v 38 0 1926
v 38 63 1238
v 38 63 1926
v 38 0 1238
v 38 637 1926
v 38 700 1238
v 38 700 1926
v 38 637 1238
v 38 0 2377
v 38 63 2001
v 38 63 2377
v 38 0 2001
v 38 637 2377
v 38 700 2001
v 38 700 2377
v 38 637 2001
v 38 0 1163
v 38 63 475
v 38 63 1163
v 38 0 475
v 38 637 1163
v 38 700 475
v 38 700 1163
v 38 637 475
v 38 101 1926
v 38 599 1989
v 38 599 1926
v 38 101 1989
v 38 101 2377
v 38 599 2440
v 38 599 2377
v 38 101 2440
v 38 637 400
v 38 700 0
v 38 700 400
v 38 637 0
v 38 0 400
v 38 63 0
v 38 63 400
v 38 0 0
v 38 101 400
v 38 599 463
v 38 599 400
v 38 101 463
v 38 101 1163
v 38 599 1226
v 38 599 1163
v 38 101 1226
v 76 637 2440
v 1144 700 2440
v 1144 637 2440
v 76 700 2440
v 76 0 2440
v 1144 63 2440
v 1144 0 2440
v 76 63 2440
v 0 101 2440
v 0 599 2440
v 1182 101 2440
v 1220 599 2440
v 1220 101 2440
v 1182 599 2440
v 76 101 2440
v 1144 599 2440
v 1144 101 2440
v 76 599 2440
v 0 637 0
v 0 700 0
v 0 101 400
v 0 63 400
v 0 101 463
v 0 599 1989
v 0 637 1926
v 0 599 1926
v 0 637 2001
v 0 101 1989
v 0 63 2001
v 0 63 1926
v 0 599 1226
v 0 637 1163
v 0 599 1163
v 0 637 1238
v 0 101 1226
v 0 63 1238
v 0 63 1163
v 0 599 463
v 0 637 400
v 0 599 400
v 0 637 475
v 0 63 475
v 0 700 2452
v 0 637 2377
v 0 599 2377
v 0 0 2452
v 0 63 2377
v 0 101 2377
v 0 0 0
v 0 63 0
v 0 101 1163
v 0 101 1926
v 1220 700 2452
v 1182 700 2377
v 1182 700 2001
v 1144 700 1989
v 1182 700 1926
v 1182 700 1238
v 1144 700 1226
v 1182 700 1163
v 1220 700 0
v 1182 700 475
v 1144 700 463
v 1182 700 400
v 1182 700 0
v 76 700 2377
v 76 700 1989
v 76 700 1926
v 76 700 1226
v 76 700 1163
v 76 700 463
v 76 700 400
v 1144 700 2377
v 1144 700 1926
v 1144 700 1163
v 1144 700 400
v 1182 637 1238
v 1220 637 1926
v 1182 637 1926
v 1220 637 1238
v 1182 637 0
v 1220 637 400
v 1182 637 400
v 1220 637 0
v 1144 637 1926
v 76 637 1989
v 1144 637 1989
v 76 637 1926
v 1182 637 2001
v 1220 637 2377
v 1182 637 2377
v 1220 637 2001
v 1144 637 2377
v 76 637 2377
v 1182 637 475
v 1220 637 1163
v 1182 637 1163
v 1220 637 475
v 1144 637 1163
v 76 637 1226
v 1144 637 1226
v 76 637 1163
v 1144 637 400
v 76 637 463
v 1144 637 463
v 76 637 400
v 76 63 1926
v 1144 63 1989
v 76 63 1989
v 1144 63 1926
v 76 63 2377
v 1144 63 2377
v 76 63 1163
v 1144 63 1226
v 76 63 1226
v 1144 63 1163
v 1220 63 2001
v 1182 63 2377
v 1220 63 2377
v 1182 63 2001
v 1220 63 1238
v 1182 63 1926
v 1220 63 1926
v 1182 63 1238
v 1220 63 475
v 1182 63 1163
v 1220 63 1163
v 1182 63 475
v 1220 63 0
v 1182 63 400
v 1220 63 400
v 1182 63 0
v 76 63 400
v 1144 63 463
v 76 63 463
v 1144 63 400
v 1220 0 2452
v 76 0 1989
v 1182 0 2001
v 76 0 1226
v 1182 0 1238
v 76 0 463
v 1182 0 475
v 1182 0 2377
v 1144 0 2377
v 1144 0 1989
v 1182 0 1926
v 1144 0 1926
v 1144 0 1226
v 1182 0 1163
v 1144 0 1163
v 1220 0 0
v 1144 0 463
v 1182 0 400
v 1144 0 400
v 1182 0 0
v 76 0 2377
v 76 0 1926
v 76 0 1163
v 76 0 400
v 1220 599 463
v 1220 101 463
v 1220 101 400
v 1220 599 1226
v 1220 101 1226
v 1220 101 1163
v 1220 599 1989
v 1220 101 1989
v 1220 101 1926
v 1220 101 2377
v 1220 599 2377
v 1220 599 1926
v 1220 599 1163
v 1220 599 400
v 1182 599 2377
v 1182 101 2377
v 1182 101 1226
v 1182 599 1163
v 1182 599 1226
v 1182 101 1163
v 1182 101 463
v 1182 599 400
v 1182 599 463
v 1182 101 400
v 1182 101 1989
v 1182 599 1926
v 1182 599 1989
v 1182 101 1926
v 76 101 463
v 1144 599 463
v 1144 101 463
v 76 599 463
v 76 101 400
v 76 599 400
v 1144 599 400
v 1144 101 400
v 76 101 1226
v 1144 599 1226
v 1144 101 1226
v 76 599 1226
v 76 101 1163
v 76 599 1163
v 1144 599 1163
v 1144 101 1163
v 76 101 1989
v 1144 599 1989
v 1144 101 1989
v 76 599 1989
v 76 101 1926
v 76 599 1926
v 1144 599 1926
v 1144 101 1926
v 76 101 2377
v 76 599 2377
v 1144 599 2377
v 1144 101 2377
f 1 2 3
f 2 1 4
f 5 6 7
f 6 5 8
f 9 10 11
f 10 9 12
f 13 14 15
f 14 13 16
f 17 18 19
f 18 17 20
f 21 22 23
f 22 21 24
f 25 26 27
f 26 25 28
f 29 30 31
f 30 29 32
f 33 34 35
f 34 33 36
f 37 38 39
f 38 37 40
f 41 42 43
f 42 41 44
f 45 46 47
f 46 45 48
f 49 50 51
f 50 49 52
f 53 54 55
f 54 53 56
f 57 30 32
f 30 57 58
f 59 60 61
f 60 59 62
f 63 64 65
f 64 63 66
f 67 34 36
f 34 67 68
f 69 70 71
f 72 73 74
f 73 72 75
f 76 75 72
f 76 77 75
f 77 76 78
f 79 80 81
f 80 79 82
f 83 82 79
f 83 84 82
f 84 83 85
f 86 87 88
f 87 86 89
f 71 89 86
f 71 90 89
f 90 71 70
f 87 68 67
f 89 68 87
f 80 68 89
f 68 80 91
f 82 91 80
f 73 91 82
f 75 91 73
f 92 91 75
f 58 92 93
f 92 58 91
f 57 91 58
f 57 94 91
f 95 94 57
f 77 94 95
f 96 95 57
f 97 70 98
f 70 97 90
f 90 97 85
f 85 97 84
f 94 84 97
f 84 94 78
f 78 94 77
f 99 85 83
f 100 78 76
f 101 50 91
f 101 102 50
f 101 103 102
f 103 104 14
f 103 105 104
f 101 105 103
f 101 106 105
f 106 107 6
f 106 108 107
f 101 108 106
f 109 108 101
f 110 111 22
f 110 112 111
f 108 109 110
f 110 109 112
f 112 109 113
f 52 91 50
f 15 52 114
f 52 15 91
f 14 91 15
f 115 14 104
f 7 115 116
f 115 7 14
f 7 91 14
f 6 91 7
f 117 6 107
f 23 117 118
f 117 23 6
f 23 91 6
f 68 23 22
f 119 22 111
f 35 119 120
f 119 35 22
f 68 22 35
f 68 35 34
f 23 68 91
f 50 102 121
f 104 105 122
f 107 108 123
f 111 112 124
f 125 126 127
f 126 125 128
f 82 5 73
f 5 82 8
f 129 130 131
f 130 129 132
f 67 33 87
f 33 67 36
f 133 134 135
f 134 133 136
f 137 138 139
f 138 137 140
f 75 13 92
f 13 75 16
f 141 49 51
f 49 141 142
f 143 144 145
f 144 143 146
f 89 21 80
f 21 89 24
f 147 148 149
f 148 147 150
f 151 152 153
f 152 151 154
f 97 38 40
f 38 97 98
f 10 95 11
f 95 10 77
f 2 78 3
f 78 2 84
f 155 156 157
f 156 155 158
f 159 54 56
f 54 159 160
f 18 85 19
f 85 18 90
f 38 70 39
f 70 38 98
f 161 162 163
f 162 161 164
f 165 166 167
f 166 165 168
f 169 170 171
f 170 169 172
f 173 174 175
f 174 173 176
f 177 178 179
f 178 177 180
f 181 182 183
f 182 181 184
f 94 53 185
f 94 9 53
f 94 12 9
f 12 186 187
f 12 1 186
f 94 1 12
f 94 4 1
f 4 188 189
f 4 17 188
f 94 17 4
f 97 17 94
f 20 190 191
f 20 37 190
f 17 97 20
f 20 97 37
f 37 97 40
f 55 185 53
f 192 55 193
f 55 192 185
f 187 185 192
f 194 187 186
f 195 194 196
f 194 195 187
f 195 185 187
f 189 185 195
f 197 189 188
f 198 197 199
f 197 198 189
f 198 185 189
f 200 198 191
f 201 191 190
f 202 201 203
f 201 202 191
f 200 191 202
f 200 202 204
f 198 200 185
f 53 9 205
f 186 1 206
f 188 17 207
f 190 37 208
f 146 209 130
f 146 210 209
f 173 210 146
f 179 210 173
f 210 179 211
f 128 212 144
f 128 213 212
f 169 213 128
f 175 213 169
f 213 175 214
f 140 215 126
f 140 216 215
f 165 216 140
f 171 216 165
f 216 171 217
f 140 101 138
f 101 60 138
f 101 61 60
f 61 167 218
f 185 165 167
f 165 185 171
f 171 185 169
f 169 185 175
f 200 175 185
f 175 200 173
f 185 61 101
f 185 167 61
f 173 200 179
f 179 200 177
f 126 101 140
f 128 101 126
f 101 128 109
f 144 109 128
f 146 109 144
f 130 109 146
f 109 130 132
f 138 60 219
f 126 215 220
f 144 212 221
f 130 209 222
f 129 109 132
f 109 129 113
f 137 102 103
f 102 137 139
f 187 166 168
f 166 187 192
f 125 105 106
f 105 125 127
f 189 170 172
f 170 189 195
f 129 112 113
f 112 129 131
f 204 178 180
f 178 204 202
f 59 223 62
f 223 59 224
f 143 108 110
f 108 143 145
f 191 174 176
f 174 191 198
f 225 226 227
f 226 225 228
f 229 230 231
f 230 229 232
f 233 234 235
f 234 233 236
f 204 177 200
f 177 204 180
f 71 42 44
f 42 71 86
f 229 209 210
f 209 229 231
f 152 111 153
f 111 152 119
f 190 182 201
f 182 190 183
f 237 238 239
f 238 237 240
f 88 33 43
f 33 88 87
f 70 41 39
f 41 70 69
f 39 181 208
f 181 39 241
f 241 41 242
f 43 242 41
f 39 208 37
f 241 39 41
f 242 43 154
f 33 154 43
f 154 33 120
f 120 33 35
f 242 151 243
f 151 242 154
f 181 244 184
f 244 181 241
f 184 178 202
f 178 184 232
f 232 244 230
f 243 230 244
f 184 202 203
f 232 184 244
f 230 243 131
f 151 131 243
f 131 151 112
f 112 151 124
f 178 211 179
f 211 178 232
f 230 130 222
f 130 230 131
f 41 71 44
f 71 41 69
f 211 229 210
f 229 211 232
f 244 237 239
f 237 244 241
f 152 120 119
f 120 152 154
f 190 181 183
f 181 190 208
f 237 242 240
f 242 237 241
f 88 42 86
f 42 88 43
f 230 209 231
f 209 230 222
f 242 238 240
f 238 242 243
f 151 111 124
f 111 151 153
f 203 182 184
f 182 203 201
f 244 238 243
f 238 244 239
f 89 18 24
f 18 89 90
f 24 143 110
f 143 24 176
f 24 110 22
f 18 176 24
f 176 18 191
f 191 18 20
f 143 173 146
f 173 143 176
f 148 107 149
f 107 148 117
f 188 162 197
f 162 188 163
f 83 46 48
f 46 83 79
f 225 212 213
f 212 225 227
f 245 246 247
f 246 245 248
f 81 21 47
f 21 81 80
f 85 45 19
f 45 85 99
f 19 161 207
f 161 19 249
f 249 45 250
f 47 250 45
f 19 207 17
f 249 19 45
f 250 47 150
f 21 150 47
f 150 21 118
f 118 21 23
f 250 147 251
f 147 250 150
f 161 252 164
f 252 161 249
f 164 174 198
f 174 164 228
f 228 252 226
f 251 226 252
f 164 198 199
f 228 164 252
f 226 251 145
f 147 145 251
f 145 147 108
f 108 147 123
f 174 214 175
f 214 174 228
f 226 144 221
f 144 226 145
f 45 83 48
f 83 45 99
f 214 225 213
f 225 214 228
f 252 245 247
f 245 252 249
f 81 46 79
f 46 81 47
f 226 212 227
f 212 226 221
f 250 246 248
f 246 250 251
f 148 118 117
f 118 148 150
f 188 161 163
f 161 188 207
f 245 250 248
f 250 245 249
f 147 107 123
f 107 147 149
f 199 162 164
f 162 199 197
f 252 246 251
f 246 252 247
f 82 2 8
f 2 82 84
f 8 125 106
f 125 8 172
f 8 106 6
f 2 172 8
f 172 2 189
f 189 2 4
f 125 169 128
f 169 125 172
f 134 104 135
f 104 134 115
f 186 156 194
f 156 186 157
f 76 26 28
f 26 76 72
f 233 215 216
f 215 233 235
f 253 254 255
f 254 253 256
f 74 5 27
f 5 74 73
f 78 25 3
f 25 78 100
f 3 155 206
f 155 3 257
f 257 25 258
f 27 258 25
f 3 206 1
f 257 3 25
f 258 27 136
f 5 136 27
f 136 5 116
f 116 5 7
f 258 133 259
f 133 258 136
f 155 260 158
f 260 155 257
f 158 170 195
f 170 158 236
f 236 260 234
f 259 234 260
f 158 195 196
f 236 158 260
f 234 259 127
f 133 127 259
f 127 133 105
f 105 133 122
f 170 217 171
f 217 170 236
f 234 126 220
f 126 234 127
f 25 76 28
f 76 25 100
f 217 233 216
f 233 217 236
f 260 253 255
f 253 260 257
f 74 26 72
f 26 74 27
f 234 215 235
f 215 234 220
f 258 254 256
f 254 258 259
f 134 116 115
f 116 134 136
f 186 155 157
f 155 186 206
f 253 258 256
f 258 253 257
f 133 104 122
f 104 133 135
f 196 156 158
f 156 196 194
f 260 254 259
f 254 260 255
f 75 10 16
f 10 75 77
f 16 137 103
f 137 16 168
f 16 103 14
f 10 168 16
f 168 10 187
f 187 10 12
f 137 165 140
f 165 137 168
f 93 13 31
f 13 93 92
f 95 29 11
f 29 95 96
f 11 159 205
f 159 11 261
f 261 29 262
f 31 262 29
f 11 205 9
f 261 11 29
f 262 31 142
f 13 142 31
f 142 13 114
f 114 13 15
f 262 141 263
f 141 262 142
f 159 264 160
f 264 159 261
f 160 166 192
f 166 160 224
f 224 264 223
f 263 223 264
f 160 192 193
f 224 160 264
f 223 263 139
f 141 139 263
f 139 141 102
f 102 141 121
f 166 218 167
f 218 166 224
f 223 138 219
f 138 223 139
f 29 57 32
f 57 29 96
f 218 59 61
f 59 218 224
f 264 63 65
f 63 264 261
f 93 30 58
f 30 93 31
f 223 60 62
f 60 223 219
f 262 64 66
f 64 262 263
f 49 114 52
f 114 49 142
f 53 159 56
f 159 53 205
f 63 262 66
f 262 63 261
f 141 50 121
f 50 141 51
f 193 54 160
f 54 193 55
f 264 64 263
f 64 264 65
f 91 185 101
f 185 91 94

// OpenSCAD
width = 1220;
height = 2440;
depth  = 700;

shelfheight = 700;

shelf1 = 400;
shelf2 = shelf1 + shelfheight + 63;
shelf3 = shelf2 + shelfheight + 63;

top = height - 63;

color("red"){
    // cls (63 x 38) left
    translate([0,depth-63,0]) { cube([38,63,height]); } // 1 x 2.4m
    translate([0,0,0])        { cube([38,63,height]); } // 1 x 2.4m

    // cls (63 x 38) right
    translate([width - 38,depth-63,0]) { cube([38,63,height]); } // 1 x 2.4m
    translate([width - 38,0,0])        { cube([38,63,height]); } // 1 x 2.4m
}

// Shelf 1
translate([0,63,shelf1])          { cube([width,38,63]); } // width
translate([38,0,shelf1])          { cube([38,depth,63]); } // width
translate([0,depth-63-38,shelf1]) { cube([width,38,63]); } // depth
translate([width-38-38,0,shelf1]) { cube([38,depth,63]); } // depth
translate([0,0,shelf1+63])        { cube([width,depth,12]); } // shelf top

// 2 x width = 2.4m
// 2 depth = 1.4m

// Shelf2
translate([0,63,shelf2])          { cube([width,38,63]); } // width
translate([0,depth-63-38,shelf2]) { cube([width,38,63]); } // width
translate([38,0,shelf2])          { cube([38,depth,63]); } // depth
translate([width-38-38,0,shelf2]) { cube([38,depth,63]); } // depth
translate([0,0,shelf2+63])        { cube([width,depth,12]); } // shelf top
// 2 x width = 2.4m
// 2 depth = 1.4m

// Shelf3
translate([0,63,shelf3])          { cube([width,38,63]); } // width
translate([0,depth-63-38,shelf3]) { cube([width,38,63]); } // width
translate([38,0,shelf3])          { cube([38,depth,63]); } // depth
translate([width-38-38,0,shelf3]) { cube([38,depth,63]); } // depth
translate([0,0,shelf3+63])        { cube([width,depth,12]); } // shelf top
// 2 x width = 2.4m
// 2 depth = 1.4m

// Top
translate([0,63,top])          { cube([width,38,63]); } // width
translate([0,depth-63-38,top]) { cube([width,38,63]); } // width
translate([38,0,top])          { cube([38,depth,63]); } // depth
translate([width-38-38,0,top]) { cube([38,depth,63]); } // depth
translate([0,0,top+63])        { cube([width,depth,12]); } // shelf top

// 2 x width = 2.4m
// 2 depth = 1.4m

// 4 x 2  = 8 lengths of .7m.
// 8 / 3 = 2.667m which is 3 x 2.4

// 

// Total of 11 x 2.4m
// 2 x 2.4 x 1.2 ply sheets
